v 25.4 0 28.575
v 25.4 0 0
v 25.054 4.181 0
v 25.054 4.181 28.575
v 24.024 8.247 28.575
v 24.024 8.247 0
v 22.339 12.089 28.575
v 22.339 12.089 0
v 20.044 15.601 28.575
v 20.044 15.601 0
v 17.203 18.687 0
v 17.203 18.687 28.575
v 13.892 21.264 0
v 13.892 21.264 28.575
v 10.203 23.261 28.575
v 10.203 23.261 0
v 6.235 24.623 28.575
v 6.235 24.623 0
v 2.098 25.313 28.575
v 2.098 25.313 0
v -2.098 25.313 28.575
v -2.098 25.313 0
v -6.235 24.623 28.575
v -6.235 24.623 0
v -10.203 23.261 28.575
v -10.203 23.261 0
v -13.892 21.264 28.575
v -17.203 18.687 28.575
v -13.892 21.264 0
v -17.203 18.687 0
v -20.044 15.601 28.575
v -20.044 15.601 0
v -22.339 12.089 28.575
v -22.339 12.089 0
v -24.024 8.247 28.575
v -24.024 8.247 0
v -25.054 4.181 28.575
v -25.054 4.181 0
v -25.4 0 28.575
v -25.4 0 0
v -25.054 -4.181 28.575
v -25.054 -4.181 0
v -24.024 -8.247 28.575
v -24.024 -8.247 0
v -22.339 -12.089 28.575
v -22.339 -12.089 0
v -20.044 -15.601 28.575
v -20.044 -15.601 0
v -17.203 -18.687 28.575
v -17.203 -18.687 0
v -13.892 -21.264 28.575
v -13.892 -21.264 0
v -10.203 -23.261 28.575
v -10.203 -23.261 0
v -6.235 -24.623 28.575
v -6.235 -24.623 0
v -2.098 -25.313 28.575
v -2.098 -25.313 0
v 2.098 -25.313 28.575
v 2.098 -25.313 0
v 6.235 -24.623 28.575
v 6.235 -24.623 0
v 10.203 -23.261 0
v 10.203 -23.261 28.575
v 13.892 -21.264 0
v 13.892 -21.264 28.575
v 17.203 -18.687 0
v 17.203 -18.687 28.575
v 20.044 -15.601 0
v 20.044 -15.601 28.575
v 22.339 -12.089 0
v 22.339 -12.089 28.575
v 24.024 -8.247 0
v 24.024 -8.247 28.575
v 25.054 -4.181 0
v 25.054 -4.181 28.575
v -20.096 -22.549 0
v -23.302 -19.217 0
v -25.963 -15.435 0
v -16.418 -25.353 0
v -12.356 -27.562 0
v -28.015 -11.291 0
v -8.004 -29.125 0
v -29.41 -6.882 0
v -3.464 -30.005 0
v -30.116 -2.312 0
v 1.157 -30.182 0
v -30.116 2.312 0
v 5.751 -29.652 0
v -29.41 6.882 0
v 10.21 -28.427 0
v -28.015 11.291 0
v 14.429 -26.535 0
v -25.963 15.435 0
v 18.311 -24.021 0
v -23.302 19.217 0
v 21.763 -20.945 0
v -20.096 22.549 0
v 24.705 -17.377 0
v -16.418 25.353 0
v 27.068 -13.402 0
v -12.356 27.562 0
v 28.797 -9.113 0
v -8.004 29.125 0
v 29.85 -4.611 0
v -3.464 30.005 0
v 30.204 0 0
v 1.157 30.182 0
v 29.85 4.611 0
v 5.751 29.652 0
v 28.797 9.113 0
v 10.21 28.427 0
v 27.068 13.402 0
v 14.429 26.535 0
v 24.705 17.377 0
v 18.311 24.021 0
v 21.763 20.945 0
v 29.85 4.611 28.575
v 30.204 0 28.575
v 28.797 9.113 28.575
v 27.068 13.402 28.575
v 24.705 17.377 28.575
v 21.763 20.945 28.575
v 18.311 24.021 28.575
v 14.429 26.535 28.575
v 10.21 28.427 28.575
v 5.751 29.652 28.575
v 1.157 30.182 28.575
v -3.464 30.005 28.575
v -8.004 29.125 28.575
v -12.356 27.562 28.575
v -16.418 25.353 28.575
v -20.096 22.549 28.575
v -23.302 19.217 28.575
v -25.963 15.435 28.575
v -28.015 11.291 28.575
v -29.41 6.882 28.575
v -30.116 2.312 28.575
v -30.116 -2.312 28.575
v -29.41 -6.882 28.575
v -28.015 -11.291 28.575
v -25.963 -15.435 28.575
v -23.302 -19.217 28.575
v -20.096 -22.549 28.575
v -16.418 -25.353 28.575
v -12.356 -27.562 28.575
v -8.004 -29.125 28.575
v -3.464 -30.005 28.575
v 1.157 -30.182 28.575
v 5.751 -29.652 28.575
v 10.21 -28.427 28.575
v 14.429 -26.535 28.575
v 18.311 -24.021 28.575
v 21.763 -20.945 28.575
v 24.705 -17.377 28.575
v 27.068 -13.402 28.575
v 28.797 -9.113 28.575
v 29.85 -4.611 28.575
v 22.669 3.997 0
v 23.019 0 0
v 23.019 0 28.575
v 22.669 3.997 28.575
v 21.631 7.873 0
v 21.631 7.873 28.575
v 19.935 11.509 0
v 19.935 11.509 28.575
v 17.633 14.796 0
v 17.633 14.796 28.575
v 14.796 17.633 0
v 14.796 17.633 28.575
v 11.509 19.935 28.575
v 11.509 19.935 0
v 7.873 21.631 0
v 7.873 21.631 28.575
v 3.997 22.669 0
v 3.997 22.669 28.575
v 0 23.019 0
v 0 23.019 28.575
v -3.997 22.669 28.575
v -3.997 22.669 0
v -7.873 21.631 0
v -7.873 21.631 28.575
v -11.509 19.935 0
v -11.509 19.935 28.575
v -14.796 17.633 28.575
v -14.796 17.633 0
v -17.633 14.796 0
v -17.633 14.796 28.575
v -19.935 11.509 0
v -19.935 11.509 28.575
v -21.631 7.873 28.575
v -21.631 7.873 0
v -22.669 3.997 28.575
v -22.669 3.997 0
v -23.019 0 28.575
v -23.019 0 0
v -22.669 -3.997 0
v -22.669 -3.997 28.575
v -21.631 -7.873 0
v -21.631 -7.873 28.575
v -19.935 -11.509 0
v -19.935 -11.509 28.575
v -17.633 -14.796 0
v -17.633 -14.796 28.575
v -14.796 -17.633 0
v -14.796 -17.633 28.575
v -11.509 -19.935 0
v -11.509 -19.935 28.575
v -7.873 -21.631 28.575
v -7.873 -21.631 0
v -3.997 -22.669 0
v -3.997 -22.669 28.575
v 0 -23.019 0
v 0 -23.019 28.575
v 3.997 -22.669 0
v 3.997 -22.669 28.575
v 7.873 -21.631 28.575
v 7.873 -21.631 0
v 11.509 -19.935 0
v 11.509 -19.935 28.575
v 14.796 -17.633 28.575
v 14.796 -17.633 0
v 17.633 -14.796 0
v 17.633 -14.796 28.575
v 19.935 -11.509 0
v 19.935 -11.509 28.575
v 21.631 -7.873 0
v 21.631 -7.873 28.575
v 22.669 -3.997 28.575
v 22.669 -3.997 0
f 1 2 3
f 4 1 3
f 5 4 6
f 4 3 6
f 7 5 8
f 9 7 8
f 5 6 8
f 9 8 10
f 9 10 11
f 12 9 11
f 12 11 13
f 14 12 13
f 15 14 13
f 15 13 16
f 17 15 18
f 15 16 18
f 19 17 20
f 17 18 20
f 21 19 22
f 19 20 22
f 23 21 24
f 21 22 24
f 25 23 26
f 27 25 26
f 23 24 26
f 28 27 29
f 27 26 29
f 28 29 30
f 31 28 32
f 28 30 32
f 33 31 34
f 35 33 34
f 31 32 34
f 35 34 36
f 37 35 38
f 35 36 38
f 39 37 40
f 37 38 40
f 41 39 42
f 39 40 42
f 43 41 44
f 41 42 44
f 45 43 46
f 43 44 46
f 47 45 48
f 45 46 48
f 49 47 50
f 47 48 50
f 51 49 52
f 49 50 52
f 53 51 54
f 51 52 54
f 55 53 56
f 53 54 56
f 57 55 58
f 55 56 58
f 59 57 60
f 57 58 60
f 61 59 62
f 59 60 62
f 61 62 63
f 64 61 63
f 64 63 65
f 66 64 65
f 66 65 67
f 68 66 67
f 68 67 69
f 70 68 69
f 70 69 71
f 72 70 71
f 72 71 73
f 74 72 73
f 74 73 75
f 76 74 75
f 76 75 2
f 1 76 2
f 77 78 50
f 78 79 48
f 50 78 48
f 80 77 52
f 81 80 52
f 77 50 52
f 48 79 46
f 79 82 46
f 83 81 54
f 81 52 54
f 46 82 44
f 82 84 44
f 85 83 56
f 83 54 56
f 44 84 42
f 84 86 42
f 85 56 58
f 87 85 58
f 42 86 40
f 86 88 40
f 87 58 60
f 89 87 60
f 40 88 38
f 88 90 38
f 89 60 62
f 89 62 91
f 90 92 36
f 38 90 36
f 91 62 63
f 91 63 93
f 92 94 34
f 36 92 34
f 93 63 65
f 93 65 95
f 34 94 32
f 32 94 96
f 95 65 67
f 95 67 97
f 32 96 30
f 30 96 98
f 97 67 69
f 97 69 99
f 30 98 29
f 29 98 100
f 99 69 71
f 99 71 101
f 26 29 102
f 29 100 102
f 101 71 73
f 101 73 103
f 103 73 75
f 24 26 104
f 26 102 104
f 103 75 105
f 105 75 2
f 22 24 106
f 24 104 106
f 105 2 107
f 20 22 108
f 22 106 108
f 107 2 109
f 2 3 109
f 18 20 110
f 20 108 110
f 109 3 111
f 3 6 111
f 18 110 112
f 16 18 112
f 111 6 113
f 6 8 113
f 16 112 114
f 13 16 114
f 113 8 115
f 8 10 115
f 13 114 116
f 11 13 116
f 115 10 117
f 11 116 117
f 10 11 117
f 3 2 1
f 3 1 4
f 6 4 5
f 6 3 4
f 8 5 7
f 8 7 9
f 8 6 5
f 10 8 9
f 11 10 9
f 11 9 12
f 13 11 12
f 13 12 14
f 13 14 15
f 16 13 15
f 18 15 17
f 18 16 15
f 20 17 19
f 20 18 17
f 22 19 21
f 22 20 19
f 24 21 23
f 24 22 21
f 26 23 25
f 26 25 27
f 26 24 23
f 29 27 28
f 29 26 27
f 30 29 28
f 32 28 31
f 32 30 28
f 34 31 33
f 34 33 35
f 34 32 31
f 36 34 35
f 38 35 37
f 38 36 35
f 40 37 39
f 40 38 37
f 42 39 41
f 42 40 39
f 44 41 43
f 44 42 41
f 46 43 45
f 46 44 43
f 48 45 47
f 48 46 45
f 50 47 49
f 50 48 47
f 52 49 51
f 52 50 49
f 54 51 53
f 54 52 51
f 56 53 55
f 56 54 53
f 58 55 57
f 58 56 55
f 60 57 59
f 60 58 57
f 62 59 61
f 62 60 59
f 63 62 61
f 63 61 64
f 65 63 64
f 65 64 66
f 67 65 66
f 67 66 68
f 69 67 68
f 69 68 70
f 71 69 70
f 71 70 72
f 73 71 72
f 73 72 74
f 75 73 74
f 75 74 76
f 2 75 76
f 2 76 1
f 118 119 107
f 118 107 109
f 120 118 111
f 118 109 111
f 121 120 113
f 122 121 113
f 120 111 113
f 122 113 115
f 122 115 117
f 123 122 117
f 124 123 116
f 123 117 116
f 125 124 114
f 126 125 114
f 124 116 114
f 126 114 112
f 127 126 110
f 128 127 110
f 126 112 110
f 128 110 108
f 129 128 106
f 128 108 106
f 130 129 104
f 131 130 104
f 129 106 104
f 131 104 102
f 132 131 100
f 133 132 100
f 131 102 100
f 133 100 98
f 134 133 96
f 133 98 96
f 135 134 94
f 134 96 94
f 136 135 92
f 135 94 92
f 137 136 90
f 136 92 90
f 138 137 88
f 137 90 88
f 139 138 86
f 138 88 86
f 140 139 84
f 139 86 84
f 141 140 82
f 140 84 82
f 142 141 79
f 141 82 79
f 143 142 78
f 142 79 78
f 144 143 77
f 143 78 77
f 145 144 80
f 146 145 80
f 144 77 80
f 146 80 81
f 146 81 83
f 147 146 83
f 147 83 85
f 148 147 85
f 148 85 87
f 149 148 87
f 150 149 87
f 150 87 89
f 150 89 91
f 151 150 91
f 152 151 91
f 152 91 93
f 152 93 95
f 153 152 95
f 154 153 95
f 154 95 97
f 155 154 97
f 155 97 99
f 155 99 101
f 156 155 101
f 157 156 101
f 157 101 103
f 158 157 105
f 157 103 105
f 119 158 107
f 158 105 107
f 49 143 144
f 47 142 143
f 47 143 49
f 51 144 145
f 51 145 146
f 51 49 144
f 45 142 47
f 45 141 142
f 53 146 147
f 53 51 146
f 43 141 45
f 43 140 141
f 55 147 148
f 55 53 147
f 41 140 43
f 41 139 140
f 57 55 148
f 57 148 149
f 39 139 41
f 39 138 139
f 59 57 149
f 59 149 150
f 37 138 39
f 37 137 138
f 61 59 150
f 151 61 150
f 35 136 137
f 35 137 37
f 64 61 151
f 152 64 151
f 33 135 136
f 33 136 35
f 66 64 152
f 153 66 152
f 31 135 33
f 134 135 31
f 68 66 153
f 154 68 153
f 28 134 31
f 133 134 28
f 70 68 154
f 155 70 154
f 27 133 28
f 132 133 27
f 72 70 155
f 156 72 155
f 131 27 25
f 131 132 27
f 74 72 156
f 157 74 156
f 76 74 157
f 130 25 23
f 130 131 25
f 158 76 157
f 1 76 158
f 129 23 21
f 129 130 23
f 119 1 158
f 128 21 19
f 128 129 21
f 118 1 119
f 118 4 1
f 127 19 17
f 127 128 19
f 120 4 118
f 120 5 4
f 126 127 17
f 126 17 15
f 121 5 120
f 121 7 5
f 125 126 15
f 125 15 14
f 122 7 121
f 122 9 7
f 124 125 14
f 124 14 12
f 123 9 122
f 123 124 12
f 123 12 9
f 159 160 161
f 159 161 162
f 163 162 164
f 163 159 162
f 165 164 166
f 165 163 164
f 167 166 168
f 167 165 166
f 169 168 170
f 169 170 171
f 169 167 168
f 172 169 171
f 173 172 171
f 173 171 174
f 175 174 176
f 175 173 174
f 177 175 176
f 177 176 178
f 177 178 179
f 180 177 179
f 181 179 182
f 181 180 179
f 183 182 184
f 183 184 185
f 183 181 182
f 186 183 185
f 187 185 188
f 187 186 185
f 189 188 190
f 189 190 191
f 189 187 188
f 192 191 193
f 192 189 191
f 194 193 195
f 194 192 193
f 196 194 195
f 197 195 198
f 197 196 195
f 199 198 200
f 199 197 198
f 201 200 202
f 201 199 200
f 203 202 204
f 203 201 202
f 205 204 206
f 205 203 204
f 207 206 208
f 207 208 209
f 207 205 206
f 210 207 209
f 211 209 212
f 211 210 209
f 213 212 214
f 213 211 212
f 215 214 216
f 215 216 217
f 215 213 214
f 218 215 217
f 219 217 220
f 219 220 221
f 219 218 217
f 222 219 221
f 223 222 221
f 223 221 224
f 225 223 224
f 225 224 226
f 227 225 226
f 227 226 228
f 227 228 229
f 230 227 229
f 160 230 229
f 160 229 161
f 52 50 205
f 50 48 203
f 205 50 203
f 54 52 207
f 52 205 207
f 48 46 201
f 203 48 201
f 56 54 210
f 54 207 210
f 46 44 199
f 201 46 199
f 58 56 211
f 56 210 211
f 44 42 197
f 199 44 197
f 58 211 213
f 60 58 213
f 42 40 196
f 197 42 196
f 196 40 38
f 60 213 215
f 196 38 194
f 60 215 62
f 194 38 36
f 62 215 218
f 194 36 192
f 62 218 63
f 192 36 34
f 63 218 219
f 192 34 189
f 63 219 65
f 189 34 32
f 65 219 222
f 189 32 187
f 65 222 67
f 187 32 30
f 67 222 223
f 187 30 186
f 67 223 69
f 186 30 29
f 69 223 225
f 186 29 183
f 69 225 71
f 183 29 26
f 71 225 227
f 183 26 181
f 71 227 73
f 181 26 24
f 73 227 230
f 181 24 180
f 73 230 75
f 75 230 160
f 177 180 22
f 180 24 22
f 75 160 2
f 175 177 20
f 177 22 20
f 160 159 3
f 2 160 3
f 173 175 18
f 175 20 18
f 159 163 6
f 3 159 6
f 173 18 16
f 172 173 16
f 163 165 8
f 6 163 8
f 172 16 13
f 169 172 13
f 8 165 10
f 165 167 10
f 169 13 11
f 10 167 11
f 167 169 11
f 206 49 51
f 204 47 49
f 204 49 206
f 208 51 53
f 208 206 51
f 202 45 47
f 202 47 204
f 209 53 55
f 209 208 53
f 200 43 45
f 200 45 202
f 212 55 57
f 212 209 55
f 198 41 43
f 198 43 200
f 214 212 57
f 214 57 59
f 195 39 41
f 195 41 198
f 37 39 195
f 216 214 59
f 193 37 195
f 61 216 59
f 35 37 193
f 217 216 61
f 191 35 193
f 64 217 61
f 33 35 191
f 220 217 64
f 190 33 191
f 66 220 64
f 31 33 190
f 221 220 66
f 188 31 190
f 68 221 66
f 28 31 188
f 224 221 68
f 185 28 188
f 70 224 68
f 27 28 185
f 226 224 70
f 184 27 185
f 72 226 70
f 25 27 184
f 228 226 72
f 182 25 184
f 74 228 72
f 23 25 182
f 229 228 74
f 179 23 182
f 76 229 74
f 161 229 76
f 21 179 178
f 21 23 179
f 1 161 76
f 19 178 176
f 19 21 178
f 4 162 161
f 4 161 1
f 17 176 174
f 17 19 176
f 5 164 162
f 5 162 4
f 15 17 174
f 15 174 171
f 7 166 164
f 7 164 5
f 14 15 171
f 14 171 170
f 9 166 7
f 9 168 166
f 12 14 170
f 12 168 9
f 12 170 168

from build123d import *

# Parameters (mm, degrees)
F0_R     = 23.01875
F1_DEPTH = 28.575
F0_R_2   = 30.20441
F0_R_3   = 25.4
F2_DEPTH = 28.575
F3_DEPTH = 28.575
F4_DEPTH = 76.2


with BuildPart() as f1:
    # F0 (on Top) → F1 (new body)
    with BuildSketch(Plane.XY):
        Circle(F0_R)
    extrude(amount=F1_DEPTH)

    # F4 (cut): a face of the model
    f4_faces = [f1.faces().sort_by_distance(p)[0] for p in [
        (0, 0, 28.575),
    ]]
    extrude(f4_faces, amount=-F4_DEPTH, mode=Mode.SUBTRACT)


with BuildPart() as f2:
    # F0 (on Top) → F2 (new body)
    with BuildSketch(Plane.XY):
        Circle(F0_R_2)
        Circle(F0_R_3, mode=Mode.SUBTRACT)
    extrude(amount=F2_DEPTH)


with BuildPart() as f3:
    # F0 (on Top) → F3 (new body)
    with BuildSketch(Plane.XY):
        Circle(F0_R_3)
        Circle(F0_R, mode=Mode.SUBTRACT)
    extrude(amount=F3_DEPTH)


solid = Compound([f2.part, f3.part])
